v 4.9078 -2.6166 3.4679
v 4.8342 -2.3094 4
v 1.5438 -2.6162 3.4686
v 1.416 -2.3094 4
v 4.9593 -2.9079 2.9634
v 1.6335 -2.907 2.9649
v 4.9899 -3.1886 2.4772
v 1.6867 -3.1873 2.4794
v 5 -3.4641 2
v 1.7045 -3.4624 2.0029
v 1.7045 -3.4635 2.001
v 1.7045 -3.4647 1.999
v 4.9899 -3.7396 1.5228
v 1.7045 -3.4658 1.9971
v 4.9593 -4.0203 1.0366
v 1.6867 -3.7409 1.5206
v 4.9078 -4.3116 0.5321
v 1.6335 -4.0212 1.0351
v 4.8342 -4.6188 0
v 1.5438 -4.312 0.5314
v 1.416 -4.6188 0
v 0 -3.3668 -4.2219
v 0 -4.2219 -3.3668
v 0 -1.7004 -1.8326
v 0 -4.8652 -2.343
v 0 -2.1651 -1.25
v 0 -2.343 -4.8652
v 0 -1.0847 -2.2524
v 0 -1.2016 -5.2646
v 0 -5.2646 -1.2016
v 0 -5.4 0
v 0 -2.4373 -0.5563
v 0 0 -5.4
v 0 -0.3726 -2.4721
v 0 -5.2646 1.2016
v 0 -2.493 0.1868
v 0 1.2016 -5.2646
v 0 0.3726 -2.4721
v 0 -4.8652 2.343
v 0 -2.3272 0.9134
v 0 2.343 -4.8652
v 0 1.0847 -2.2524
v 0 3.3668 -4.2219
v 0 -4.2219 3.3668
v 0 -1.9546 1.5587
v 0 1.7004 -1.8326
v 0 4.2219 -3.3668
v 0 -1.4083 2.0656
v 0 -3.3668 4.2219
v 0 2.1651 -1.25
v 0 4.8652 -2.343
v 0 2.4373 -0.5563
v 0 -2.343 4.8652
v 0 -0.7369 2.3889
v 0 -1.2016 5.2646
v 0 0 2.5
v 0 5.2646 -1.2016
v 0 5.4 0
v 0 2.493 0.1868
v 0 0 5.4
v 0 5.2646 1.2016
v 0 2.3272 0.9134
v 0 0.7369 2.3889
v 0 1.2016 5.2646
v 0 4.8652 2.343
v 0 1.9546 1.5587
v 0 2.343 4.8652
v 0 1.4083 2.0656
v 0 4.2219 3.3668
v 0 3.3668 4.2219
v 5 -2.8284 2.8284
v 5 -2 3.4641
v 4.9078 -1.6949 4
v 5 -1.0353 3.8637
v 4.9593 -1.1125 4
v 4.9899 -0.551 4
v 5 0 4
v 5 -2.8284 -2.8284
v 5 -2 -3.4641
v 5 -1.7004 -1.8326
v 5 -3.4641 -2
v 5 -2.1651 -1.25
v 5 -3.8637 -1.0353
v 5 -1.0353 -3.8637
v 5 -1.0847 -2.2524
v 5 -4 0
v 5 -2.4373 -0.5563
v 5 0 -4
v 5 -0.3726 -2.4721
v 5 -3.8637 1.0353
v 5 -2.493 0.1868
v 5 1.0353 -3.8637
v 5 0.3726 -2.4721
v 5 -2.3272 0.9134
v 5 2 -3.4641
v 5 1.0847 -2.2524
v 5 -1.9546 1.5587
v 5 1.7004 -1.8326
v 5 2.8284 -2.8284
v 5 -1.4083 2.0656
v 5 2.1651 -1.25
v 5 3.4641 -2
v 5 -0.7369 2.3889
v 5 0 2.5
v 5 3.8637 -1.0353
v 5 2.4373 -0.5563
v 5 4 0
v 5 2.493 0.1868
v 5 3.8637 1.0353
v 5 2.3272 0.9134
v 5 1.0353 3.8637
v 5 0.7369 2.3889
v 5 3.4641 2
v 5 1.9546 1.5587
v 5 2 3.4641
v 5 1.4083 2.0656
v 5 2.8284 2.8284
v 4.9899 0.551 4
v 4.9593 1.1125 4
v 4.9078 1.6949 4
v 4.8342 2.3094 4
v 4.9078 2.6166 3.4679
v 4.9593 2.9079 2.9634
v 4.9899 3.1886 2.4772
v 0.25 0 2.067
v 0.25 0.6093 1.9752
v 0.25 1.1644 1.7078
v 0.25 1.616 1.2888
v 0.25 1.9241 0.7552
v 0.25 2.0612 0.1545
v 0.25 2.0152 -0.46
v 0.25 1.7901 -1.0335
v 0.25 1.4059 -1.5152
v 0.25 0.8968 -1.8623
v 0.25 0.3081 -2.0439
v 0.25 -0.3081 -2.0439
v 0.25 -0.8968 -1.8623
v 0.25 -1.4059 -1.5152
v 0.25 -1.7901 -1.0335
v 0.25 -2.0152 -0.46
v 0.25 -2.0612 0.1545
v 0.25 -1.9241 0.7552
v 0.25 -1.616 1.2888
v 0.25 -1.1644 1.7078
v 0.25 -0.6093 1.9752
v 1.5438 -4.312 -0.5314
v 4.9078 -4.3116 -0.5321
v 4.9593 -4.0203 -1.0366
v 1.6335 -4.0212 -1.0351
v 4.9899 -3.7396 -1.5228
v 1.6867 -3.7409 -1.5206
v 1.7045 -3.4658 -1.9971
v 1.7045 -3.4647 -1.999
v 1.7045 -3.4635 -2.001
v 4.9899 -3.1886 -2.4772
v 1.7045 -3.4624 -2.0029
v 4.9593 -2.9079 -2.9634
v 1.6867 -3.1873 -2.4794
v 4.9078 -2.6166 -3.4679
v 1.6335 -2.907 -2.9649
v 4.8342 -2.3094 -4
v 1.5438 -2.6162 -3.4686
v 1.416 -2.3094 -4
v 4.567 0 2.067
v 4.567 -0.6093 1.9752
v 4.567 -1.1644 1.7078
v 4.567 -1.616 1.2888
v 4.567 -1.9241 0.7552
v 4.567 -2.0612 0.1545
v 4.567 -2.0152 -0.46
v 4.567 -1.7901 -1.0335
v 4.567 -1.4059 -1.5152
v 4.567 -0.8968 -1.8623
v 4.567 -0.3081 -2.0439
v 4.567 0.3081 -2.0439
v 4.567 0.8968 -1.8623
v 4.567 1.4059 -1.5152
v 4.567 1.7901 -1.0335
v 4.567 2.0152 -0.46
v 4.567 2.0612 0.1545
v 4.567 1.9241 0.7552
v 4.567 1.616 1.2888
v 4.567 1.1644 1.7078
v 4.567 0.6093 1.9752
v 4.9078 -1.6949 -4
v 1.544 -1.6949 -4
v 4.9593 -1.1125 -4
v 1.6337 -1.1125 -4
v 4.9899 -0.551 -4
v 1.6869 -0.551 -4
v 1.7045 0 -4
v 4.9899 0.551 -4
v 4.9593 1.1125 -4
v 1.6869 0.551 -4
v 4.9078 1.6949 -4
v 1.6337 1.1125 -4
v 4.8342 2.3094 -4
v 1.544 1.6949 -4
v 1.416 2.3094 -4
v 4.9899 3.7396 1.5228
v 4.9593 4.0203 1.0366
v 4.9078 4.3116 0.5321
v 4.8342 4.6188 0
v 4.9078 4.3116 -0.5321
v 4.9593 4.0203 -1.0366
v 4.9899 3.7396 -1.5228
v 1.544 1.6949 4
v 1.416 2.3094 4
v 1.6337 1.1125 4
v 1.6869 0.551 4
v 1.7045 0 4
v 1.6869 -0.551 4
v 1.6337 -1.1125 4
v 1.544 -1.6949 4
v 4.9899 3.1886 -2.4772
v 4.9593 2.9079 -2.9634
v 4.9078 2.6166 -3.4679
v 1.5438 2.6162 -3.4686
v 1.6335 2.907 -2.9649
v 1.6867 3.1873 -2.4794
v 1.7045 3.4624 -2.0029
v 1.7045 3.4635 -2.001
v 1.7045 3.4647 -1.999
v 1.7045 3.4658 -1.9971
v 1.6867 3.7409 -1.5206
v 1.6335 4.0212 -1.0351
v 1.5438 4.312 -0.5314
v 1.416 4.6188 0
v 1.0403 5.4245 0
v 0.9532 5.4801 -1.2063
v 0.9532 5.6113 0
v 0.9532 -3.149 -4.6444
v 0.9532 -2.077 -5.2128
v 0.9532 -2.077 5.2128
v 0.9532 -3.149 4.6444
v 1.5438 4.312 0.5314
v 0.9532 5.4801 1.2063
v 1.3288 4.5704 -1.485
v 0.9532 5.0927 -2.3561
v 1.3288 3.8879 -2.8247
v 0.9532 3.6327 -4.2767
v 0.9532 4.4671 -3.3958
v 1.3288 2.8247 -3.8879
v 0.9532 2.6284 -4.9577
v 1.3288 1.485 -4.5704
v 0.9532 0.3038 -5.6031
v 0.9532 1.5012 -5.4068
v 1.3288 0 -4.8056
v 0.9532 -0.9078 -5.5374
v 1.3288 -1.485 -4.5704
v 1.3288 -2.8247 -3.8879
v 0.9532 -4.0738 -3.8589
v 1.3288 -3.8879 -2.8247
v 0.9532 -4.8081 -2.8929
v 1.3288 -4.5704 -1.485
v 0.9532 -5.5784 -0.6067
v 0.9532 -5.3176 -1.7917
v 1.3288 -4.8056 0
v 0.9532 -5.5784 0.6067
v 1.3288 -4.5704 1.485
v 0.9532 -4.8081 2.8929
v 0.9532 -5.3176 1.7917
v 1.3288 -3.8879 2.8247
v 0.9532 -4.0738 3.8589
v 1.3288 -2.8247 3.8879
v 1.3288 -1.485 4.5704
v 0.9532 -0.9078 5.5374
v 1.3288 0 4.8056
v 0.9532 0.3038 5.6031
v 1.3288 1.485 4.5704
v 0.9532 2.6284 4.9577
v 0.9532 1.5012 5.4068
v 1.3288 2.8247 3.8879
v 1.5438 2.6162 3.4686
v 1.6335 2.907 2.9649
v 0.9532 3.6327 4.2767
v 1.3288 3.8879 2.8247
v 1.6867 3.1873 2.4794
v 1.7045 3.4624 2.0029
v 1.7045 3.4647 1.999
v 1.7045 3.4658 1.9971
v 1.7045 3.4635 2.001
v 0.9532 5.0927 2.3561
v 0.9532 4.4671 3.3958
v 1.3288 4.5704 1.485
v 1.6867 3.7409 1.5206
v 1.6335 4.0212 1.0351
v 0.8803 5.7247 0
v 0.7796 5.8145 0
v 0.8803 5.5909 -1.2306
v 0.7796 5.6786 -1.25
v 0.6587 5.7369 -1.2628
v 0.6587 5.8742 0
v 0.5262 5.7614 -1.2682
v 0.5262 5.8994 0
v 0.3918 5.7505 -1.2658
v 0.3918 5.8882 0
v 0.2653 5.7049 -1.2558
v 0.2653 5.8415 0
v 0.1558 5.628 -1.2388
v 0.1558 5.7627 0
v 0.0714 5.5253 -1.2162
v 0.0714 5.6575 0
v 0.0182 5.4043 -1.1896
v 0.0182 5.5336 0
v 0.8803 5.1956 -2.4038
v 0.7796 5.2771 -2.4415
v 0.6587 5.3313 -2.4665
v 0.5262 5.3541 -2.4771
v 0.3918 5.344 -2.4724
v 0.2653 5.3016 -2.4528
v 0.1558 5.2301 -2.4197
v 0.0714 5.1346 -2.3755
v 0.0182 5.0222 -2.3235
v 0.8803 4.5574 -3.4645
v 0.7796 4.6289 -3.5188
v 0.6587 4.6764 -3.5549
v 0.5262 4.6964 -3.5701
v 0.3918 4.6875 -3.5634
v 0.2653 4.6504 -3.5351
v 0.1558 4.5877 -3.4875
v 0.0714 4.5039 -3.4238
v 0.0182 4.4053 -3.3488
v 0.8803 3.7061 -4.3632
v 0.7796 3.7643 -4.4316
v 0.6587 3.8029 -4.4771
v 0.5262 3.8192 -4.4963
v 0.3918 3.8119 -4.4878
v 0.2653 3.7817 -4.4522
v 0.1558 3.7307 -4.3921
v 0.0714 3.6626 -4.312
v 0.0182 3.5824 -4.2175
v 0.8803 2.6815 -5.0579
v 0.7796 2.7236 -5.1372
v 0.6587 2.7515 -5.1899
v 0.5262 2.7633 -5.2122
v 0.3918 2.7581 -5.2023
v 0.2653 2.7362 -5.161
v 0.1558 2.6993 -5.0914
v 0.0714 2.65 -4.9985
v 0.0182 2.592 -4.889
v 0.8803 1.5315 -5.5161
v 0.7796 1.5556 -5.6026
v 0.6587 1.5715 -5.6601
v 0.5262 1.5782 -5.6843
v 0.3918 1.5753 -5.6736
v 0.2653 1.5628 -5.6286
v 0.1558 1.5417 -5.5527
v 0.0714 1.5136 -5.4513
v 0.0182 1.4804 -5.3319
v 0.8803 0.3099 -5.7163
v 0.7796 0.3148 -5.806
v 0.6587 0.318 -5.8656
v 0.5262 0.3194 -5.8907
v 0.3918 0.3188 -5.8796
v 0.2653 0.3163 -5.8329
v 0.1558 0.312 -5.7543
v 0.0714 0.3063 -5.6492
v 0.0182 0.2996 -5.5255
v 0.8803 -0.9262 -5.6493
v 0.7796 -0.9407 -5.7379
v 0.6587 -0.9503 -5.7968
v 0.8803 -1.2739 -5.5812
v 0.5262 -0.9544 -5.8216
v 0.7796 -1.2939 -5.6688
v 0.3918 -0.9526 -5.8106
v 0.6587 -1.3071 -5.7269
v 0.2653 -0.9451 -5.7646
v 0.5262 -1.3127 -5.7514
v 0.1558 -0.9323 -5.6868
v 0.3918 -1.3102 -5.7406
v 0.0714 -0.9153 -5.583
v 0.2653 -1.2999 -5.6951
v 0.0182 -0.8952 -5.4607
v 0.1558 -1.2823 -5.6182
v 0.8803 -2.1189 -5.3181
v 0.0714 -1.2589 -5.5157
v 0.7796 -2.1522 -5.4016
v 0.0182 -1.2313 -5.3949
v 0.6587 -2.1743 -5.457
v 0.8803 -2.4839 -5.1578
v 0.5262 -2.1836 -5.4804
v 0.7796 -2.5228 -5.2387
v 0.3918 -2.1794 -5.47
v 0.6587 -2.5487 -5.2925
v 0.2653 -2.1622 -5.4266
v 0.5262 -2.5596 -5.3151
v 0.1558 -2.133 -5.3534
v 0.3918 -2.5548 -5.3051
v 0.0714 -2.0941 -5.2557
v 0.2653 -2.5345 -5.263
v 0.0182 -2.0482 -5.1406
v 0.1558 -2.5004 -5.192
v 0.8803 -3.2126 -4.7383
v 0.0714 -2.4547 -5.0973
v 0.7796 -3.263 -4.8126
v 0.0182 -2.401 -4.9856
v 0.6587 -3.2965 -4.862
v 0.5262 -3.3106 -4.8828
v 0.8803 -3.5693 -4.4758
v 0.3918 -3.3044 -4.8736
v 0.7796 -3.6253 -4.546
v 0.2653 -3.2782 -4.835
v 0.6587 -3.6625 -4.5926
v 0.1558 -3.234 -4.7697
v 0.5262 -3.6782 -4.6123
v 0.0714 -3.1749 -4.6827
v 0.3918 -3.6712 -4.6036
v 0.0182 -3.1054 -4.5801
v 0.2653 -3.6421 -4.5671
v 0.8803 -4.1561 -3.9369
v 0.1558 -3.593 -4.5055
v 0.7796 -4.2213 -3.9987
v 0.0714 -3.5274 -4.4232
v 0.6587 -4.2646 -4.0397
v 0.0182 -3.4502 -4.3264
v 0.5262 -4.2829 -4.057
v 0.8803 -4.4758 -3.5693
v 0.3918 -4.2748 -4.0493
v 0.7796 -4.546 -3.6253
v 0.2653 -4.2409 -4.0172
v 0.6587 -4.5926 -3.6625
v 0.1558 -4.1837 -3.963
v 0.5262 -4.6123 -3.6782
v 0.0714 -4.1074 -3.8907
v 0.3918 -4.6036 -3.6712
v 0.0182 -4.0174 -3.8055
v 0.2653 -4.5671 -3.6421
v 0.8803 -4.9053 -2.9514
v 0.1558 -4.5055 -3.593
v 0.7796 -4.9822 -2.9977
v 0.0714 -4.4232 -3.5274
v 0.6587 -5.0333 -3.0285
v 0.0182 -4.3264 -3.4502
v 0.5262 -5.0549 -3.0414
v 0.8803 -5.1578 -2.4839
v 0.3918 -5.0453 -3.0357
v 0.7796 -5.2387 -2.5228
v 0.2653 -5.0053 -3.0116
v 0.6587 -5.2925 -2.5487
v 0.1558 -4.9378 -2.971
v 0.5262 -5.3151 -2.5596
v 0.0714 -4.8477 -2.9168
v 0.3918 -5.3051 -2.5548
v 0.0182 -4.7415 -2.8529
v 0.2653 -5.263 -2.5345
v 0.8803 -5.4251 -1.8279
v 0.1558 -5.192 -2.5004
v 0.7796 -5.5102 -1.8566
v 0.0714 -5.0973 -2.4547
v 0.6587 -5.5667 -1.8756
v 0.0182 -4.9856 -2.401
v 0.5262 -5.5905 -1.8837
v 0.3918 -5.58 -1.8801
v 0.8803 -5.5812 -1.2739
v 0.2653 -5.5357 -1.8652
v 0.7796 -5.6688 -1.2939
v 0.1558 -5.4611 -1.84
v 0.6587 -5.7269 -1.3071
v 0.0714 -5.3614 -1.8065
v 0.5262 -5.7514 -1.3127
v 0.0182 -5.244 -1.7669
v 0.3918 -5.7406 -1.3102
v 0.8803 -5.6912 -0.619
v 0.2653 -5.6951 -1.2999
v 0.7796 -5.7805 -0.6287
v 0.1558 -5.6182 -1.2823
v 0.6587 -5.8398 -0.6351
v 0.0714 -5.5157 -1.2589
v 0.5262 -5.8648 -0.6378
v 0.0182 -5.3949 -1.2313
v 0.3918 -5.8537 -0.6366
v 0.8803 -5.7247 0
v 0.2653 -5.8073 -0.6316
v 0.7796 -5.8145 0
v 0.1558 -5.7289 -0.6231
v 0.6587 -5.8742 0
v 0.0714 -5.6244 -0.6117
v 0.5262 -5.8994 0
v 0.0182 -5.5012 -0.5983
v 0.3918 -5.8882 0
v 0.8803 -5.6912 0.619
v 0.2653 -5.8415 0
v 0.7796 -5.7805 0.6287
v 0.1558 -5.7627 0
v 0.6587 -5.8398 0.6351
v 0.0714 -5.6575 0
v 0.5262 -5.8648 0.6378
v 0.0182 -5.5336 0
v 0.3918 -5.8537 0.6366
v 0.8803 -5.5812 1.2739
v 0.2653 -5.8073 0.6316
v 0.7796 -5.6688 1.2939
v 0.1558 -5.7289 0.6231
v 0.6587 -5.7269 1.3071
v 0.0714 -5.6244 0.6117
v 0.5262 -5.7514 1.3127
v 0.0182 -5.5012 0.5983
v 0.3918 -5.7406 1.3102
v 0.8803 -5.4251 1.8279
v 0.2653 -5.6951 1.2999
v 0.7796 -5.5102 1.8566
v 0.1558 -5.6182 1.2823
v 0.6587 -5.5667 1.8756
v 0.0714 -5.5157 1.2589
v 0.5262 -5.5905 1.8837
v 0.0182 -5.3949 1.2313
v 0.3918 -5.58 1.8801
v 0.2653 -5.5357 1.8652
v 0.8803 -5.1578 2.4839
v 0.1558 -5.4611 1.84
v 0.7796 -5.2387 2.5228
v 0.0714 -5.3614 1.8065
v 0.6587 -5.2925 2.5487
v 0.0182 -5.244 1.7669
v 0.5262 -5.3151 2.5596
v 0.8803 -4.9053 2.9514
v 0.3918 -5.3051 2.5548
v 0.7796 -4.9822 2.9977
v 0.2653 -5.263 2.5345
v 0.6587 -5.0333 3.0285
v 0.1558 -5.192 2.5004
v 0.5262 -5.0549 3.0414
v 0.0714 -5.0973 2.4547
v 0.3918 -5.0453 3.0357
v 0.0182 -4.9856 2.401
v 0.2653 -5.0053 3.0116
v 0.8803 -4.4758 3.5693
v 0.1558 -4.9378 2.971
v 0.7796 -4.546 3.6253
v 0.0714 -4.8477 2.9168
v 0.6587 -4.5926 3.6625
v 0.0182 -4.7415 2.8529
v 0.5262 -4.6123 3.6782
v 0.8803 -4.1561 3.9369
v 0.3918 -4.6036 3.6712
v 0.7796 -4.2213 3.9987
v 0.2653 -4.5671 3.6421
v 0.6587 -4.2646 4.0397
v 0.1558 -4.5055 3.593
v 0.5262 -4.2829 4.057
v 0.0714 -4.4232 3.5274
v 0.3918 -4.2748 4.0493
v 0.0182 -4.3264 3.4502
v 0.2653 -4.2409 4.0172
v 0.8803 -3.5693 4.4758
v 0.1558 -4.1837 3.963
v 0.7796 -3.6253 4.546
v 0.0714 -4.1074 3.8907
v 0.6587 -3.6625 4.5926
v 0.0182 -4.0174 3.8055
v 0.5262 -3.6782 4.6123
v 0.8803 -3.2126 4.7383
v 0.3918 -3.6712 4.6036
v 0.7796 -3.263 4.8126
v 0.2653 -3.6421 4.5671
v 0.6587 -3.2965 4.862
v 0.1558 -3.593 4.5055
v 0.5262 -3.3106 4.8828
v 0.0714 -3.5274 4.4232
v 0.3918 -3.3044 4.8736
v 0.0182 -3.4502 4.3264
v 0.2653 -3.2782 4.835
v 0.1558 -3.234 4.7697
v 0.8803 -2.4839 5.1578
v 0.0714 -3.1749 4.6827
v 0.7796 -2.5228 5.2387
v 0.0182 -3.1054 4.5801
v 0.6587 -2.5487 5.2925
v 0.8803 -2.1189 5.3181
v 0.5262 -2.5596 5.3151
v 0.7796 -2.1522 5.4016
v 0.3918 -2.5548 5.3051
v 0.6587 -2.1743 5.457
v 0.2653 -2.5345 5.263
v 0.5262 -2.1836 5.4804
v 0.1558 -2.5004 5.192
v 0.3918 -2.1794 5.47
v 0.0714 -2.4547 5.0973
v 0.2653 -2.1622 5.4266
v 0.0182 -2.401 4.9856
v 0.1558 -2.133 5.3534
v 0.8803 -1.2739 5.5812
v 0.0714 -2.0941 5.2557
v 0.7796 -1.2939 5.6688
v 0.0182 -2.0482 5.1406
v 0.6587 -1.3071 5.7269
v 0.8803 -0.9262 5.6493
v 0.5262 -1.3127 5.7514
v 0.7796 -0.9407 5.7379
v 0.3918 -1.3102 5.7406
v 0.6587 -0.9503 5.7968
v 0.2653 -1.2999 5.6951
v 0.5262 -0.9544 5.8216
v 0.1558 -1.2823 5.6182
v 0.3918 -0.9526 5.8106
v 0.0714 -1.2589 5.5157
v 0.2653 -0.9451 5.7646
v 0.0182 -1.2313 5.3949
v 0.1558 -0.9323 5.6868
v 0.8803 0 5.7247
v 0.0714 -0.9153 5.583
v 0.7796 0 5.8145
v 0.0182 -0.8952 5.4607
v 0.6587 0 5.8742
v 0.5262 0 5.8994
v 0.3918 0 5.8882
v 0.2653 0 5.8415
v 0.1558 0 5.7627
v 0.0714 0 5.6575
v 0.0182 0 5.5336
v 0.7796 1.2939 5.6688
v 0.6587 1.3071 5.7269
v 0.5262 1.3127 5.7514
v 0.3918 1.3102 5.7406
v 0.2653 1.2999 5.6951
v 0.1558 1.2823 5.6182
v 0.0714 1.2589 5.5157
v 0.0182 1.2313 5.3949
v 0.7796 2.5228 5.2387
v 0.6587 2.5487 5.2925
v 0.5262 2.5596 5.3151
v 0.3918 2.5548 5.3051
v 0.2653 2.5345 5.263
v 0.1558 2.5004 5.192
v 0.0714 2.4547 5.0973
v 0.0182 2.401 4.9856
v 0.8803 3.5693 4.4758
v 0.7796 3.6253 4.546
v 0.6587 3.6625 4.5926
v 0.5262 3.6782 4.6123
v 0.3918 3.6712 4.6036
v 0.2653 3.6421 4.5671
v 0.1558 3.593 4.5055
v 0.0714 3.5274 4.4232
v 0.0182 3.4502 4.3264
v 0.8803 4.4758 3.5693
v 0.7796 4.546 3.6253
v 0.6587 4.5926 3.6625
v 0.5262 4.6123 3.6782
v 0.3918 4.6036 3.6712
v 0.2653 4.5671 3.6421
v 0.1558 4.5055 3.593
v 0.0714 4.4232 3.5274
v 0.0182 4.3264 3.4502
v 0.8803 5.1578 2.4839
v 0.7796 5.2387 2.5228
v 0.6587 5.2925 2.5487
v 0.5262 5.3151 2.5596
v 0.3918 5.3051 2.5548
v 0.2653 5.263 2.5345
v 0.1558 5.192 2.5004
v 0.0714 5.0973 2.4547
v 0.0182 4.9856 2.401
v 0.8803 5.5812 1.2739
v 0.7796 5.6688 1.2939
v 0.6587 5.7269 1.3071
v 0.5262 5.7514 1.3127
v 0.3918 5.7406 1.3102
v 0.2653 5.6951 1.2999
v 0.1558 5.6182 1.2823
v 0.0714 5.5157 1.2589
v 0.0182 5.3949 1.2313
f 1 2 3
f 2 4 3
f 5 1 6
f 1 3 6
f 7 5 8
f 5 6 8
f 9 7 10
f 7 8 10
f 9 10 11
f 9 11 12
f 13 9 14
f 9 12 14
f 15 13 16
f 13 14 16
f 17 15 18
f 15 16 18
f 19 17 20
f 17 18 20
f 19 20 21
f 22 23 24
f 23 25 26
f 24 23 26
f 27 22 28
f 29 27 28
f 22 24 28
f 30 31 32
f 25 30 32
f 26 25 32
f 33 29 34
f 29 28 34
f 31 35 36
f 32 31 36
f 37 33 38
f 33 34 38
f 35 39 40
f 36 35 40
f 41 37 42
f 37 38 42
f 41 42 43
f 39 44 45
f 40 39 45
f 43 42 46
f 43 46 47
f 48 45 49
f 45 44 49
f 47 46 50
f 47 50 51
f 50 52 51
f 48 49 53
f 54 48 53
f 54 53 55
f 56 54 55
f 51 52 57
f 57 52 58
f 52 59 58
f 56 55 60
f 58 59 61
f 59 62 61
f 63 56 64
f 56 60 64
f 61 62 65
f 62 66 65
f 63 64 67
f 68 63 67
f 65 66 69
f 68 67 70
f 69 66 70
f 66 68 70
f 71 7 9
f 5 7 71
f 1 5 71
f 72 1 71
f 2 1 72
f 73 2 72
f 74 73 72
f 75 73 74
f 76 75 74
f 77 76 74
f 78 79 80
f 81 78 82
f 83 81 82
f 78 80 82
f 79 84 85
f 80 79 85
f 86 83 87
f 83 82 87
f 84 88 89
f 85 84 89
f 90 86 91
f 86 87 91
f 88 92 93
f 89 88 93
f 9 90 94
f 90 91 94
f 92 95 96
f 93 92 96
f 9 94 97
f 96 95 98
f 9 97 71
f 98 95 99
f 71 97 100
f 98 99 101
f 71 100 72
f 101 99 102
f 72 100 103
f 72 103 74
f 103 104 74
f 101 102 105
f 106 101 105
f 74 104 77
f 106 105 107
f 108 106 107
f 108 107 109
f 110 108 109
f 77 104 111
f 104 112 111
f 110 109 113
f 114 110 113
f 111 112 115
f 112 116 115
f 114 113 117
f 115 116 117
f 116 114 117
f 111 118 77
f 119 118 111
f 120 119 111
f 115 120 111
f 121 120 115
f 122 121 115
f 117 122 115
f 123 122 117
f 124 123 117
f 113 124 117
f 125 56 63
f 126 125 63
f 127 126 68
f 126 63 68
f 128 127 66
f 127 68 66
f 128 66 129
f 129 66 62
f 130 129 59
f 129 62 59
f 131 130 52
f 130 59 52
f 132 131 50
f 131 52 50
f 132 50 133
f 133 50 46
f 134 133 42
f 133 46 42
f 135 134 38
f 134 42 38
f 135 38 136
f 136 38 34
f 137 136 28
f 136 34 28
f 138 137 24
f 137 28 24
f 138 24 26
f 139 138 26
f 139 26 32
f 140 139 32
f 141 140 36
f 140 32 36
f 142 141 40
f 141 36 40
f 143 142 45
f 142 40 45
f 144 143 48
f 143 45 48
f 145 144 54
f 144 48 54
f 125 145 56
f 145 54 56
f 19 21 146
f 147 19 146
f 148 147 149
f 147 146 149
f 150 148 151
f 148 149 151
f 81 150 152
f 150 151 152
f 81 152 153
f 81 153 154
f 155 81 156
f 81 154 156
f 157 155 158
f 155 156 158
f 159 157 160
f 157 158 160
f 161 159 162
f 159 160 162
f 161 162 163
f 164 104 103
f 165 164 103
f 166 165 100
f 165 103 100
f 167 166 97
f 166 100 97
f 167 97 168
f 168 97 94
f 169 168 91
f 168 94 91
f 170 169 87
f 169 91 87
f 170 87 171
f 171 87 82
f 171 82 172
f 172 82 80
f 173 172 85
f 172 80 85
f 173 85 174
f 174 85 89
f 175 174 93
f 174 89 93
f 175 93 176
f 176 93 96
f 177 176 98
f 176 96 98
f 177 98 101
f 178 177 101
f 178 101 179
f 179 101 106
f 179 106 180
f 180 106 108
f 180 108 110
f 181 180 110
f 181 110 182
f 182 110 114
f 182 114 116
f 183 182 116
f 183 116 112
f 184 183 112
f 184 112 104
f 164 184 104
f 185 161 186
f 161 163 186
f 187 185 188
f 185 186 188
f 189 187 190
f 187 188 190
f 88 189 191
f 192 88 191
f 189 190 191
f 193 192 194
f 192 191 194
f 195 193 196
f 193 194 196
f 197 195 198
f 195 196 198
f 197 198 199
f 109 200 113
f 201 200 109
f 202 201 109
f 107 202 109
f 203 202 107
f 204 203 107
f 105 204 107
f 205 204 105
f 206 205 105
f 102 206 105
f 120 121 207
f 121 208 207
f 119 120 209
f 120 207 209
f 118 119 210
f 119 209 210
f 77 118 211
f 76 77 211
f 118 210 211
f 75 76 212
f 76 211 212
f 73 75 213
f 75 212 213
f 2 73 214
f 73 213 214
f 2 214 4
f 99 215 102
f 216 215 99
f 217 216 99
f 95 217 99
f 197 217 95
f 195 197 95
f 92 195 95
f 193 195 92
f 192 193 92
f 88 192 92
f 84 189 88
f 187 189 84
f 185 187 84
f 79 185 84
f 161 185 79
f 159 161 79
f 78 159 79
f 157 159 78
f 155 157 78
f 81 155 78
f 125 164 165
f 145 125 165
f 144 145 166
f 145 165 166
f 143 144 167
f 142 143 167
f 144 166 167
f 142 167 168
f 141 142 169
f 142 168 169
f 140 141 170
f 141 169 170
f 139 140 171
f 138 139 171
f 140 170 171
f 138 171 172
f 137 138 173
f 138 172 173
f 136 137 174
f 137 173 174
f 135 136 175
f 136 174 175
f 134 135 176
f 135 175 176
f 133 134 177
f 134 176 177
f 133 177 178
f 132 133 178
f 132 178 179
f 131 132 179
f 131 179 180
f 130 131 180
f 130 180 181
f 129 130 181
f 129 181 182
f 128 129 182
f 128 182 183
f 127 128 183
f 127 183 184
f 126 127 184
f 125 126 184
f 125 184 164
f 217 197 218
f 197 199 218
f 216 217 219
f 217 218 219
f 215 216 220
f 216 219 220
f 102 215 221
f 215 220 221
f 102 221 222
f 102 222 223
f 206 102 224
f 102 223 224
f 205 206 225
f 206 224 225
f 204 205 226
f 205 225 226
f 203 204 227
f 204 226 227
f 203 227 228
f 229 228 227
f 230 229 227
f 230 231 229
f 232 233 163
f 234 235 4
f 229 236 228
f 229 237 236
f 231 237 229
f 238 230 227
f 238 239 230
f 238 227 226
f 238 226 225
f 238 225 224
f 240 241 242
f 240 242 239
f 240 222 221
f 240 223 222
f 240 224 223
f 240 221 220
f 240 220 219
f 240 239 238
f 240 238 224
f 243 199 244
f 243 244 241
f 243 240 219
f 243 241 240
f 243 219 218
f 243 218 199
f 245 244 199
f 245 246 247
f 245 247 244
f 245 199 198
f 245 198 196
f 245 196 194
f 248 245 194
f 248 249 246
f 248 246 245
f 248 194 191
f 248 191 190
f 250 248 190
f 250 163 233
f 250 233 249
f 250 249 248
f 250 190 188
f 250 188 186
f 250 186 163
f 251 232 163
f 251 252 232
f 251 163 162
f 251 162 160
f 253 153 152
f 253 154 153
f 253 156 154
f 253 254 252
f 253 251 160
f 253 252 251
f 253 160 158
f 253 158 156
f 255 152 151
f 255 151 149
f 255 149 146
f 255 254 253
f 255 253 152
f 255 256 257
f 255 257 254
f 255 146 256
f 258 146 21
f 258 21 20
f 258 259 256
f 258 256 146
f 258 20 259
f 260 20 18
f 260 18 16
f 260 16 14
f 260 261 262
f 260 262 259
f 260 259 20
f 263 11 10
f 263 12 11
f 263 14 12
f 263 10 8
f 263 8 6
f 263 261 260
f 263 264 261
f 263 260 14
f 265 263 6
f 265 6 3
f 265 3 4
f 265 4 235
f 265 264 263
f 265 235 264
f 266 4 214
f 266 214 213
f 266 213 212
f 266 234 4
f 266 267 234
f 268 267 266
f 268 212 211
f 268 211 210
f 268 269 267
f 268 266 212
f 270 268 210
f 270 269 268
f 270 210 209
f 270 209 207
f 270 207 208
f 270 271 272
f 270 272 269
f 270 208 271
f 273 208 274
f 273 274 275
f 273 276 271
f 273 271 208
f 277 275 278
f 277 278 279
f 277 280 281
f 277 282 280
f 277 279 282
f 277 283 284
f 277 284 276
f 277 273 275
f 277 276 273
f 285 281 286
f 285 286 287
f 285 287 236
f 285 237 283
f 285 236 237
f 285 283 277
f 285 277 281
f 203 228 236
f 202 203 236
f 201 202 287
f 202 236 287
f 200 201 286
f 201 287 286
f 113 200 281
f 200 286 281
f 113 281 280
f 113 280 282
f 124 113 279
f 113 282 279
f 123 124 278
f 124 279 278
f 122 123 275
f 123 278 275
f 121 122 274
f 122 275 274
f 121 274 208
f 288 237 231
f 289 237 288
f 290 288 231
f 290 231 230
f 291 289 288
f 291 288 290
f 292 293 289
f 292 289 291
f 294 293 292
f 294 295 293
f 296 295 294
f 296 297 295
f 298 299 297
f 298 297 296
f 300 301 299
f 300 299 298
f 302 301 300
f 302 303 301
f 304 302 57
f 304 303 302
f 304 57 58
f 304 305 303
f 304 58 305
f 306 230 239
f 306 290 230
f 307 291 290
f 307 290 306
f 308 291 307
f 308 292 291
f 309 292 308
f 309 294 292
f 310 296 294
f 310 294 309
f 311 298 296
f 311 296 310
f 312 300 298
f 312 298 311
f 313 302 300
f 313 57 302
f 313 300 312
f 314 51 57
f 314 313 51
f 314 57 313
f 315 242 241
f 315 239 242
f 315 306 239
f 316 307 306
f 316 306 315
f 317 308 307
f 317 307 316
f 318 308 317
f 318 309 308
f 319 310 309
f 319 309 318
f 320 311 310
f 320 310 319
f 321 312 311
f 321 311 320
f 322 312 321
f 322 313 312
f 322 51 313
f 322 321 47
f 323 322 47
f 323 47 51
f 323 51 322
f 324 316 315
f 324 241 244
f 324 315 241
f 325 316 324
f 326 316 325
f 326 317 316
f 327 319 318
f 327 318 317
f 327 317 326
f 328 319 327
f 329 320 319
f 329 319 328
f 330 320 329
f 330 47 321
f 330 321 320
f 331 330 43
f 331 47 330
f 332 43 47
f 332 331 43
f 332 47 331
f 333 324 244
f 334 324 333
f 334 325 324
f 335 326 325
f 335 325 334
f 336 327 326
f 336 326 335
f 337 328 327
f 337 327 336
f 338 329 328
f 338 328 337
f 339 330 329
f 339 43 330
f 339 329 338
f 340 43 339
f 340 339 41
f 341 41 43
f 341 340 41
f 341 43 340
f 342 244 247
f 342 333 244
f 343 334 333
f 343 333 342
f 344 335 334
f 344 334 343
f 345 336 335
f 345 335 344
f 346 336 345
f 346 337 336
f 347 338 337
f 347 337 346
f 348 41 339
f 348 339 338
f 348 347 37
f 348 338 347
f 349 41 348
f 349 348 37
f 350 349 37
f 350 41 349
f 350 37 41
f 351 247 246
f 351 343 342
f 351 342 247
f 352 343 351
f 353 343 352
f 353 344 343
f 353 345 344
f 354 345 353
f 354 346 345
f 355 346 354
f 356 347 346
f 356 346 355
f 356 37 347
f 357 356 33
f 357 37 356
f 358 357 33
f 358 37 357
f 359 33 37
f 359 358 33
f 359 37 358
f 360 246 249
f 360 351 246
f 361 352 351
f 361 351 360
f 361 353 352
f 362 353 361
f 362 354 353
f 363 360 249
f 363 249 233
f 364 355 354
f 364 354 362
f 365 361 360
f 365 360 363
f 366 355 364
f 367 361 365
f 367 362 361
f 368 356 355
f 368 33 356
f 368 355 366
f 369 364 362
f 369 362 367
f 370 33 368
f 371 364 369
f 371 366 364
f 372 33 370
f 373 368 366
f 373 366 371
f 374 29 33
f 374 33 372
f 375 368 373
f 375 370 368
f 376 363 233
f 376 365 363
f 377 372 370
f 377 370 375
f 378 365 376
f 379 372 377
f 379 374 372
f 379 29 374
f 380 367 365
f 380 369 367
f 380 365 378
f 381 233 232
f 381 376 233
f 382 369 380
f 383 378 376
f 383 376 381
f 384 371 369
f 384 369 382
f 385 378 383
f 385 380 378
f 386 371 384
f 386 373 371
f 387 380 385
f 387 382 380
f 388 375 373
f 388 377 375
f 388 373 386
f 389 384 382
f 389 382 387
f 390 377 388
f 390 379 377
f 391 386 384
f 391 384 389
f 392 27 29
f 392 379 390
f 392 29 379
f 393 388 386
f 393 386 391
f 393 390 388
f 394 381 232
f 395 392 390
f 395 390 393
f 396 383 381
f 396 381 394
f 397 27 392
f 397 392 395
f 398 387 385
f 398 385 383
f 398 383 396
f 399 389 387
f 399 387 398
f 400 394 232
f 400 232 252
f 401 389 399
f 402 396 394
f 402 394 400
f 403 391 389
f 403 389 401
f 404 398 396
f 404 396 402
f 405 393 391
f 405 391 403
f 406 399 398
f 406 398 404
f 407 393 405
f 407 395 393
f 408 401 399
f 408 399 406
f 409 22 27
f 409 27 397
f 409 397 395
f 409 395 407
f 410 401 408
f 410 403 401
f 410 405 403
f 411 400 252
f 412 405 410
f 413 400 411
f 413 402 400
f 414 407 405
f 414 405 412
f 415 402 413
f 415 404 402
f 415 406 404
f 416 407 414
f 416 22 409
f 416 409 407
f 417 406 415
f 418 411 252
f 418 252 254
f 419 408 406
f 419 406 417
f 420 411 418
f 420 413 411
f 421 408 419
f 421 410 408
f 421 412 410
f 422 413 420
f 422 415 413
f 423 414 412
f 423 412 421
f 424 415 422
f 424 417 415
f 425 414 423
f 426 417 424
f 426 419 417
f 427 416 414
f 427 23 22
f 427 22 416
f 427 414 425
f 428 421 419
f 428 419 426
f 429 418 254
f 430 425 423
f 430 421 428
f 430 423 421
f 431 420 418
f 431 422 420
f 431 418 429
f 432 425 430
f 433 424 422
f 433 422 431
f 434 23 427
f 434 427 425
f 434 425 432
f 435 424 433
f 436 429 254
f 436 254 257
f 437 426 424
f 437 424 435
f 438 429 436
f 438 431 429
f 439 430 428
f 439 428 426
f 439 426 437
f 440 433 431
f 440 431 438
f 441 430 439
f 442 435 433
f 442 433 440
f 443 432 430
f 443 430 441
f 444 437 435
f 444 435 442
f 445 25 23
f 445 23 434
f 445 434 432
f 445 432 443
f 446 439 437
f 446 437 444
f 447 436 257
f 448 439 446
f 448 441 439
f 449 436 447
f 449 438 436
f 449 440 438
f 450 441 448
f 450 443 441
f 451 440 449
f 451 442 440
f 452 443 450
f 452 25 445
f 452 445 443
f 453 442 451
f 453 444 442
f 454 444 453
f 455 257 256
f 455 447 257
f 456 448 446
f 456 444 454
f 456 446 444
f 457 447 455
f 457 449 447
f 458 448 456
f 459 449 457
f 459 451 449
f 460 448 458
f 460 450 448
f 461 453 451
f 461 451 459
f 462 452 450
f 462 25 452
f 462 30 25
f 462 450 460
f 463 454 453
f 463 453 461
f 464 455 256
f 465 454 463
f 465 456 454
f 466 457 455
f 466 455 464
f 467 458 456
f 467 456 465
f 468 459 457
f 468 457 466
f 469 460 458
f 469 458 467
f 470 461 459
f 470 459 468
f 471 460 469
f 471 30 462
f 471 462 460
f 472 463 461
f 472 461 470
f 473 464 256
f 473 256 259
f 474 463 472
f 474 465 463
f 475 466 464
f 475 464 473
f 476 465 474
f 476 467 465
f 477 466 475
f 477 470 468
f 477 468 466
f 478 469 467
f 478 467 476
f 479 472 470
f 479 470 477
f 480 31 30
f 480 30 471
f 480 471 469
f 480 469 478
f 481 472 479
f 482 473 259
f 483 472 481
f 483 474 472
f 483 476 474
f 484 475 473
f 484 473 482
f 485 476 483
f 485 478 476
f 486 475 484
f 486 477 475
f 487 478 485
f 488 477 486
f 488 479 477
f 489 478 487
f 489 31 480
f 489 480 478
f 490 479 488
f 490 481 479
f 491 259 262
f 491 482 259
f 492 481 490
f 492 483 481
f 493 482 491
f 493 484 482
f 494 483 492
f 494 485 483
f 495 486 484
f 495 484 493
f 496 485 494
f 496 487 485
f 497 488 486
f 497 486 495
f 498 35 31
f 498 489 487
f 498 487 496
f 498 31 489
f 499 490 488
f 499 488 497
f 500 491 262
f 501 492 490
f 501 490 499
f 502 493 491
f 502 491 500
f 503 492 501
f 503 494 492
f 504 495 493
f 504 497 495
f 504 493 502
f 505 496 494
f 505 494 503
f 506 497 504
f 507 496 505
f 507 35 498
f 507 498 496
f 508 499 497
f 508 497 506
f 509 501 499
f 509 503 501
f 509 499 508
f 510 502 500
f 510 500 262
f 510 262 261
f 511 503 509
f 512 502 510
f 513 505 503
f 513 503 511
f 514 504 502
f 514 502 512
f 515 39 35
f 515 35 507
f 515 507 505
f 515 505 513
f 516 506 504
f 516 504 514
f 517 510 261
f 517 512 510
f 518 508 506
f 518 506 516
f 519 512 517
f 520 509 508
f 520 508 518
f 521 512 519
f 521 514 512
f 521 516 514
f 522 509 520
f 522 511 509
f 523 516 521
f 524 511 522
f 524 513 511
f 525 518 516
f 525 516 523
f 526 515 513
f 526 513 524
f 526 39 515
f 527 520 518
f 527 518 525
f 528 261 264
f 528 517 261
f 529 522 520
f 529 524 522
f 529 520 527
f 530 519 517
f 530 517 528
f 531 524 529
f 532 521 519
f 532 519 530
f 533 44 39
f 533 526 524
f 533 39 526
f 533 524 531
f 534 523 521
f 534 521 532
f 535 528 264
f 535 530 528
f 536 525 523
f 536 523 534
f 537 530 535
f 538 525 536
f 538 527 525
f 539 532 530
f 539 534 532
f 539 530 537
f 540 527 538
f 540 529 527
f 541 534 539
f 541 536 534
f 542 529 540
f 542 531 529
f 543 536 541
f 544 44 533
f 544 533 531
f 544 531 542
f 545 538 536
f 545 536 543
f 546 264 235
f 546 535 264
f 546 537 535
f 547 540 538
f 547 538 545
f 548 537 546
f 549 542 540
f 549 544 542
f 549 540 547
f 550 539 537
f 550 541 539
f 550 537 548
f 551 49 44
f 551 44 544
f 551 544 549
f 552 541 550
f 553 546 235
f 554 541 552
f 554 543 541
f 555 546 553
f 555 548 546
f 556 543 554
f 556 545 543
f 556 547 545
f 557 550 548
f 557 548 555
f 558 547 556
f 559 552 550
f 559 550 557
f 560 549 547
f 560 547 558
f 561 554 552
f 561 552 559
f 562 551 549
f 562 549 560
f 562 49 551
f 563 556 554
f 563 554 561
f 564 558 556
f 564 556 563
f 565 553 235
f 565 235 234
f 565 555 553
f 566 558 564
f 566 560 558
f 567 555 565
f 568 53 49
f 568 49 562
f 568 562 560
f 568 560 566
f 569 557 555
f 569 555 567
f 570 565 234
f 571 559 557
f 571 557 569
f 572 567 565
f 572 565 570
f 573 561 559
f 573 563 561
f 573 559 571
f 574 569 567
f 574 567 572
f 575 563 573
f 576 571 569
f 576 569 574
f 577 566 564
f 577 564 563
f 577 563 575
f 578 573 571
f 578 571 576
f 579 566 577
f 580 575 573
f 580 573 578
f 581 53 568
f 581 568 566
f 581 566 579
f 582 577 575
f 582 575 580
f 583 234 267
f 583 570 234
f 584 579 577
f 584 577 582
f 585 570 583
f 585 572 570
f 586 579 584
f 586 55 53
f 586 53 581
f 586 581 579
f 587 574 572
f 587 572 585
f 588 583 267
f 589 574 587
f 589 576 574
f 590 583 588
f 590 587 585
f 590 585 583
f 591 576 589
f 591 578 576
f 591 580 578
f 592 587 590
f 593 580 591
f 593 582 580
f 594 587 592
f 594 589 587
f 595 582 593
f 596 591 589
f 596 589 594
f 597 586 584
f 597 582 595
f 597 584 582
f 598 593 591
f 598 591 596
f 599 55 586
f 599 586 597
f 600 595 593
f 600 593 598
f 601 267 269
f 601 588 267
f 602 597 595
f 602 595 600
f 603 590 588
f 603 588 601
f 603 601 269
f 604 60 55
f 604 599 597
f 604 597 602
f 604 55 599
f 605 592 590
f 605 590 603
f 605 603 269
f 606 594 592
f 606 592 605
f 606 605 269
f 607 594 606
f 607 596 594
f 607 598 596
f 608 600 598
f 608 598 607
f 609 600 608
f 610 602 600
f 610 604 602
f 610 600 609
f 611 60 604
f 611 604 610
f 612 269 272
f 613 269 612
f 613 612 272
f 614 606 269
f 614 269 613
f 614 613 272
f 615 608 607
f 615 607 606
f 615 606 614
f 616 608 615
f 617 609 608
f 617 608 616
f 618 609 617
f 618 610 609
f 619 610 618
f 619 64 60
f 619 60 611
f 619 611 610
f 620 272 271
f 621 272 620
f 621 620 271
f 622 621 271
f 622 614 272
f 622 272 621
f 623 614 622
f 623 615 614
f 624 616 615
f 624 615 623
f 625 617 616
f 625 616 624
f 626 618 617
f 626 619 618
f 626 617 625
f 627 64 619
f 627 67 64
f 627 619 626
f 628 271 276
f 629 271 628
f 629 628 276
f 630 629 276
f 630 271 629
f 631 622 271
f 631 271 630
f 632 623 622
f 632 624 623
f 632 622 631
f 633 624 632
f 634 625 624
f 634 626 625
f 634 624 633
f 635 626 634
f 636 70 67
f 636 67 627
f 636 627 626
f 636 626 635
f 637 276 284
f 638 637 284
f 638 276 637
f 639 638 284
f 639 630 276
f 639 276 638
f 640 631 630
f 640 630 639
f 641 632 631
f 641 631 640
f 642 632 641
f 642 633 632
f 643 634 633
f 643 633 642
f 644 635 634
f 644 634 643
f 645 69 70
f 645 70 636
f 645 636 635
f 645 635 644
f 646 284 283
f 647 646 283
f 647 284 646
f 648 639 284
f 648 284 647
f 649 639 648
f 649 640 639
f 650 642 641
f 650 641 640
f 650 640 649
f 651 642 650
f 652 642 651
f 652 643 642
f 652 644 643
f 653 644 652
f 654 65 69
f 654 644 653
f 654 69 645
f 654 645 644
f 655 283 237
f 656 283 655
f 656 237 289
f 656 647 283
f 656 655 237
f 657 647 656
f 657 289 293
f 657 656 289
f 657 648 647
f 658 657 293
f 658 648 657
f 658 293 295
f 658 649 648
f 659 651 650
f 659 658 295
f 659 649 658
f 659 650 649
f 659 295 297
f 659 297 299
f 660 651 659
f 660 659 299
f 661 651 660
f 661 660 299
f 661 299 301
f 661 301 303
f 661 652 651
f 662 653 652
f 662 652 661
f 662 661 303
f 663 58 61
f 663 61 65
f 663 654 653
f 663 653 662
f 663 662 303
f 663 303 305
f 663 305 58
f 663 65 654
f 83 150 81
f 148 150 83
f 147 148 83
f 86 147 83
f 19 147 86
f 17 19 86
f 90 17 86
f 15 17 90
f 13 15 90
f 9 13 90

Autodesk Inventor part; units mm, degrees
ref_plane "YZ Plane" through (0, 0, 0) normal (1, 0, 0) x (0, 1, 0)
ref_plane "XZ Plane" through (0, 0, 0) normal (0, 1, 0) x (-1, 0, 0)
sketch "Sketch1" plane through (0, 0, 0) normal (0, 0, 1) x (1, 0, 0)
  line L0 (-1.1018, 0) -> (6.017, 0) projected
  line L1 (1.7045, 4) -> (0.9532, 5.6113)
  line L2 (1.7045, 4) -> (5, 4) construction
  line L3 (5, 4) -> (5, 0) construction
  arc A0 (0.9532, 5.6113) -> (0, 5.4) centre (0.5, 5.4) ccw
  line L4 (1.7045, 4) -> (1.7045, 0)
  line L5 (0, -1.1988) -> (0, 7.1926) projected
  point P0 (0, 0)
  dimension "d2" = 8
  dimension "d4" = 11.8
  dimension "d5" = 0.5
  dimension "d15" = 5
  dimension "d16" = 25
revolve "Ring" add sketch "Sketch1" angle 360 about axis through (-10, 0, 0) along (1, 0, 0)
sketch "Sketch2" plane through (0, 0, 0) normal (-1, 0, 0) x (0, 0, 1)
  circle A0 centre (0, 0) radius 4.9
  line L0 (-4, -2.3094) -> (-4, 2.3094)
  line L1 (-4, 2.3094) -> (0, 4.6188)
  line L2 (0, 4.6188) -> (4, 2.3094)
  line L3 (4, 2.3094) -> (4, -2.3094)
  line L4 (4, -2.3094) -> (0, -4.6188)
  line L5 (0, -4.6188) -> (-4, -2.3094)
  circle A1 centre (0, 0) radius 5.4 projected
  dimension "d6" = 9.2376
extrude "Body" add sketch "Sketch2" against normal blind 5 contours L0 L1 L2 L3 L4 L5
sketch "Sketch3" plane through (0, 0, 0) normal (0, 0, 1) x (1, 0, 0)
  line L0 (1.416, 4.6188) -> (5, 4.6188) projected
  line L1 (5, 2.3094) -> (5, 4.6188) projected
  line L2 (0, -5.4) -> (0, 5.4) projected
  line L3 (-1, 0) -> (6, 0) projected
  line L4 (4.8342, 4.6188) -> (5, 4)
  dimension "d10" = 15
  dimension "d11" = 8
revolve "Chamfer1" cut sketch "Sketch3" angle 360 about axis through (-10, 0, 0) along (1, 0, 0)
sketch "Sketch4" plane through (0, 0, 0) normal (-1, 0, 0) x (0, 0, 1)
  circle A0 centre (0, 0) radius 5.4 projected
hole "Thread" at (0, 0, 0) direction (1, 0, 0) diameter 4.134 end through all thread size "M5x0.8" class "6H" standard "ISO Metric profile"
chamfer "Chamfer2" distance 0.433 angle 30 1 edges at (0, 0, -2.067) measured on face at (0, 4.2317, -0.5138)
ref_plane "Work Plane1" through (17.4207, 0, 0) normal (0, 0, -1) x (-1, 0, 0)
chamfer "Chamfer3" distance 0.433 angle 45 1 edges at (5, 0, -2.067)
equation "\"d6\" = 1.1547 * SW"
equation "\"d7\" = KOH"
equation "\"d12\" = -0.5 * GD1 + 0.5 * NND"
equation "\"d46\" = -0.5 * GD1 + 0.5 * NND"
equation "\"d51\" = -0.5 * GD1 + 0.5 * NND"
equation "\"d2\" = SW"
equation "\"d4\" = LADI"
equation "\"d5\" = PHH"
equation "\"d15\" = KOH"
equation "\"d16\" = KEWI"
equation "\"d10\" = ANG1"
equation "\"d11\" = SW0"
equation "\"ANG1\" = 15deg"
equation "\"KEWI\" = 25deg"
equation "\"NND\" = 5"
equation "\"LADI\" = 11.8"
equation "\"SW\" = 8"
equation "\"PHH\" = RR"
equation "\"KOH\" = 5"
equation "\"SW0\" = SW"
equation "\"d1\" = LADI"
equation "\"d3\" = PHH"
equation "\"GUL\" = 0.541266 * PTC"
equation "\"RR\" = 0.5"
equation "\"THREADDIA\" = 5"
equation "\"TOA\" = 30deg"
equation "\"PTC\" = 0.8"
equation "\"GAL\" = 0.541266 * PTC"
equation "\"E0\" = 1.155 * SW"
equation "\"GD1\" = 4.133975"
properties part number "DIN EN 1661 - M5" material "Steel, Mild"
